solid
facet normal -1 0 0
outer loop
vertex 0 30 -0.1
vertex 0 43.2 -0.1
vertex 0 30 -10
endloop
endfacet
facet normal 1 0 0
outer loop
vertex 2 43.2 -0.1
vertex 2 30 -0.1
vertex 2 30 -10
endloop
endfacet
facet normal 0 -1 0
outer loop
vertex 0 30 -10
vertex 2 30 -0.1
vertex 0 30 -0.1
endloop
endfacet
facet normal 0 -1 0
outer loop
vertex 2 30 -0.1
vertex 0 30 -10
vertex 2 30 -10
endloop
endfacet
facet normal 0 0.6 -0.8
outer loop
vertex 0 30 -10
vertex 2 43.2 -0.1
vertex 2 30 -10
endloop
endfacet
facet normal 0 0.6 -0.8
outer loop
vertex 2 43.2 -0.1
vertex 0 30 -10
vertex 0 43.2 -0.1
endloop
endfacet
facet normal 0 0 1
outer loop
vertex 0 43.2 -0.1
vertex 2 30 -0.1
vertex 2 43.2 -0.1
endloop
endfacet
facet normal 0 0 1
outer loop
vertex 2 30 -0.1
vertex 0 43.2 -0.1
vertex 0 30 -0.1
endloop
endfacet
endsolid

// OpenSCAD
/* Vorlesungsbeispiel, Koordinatensystem in 3D,

   Einmal normal drucken, und einmal an der x-Achse gespiegelt drucken.
   
   Copyright, 2023, Mathias Moog, Hochschule Ansbach, Deutschland, CC-BY-NC-SA
*/

d=2;
$fn=60;

// Erzeude den Pfeil in x-Richtung 
// und einen gebogenen Pfeil in y-Richtung
module pfeil( achse ) {
  linear_extrude(d) {
  difference() {
    union() {
      // Spitze
      polygon( [[30,-10],[30,20],[50,5]] );
      // Kreisbogen, außen
      translate([0,5]) circle(r=20);
    }
    // Beschriftung
    translate([33,5]) rotate(-90) text( achse, size=10, halign="center");
    // Kreis innen
    translate([0,5]) circle(r=15);
    // Alles negative weg ... 
    translate([-50,-25]) square(50);
    translate([0,-25]) square(25);
    // Platz für Pfeil
    translate([-5,17]) square(10);
  }
  // Schaft
  scale([3,1]) square(10);
  // Pfeilspitze
  polygon( [[0,22.5], [5,28], [5,17] ] );
}
}

module koord3d() {
  pfeil( "x" );
  rotate([90,0,90]) pfeil( "y" );
  rotate([0,-90,-90]) pfeil( "z" );
}

//koord3d();

// Einfacherer Druck, z<0 abschneiden
intersection() {
  koord3d();
  translate([-100,-100,-200.1]) cube(200);
}  
